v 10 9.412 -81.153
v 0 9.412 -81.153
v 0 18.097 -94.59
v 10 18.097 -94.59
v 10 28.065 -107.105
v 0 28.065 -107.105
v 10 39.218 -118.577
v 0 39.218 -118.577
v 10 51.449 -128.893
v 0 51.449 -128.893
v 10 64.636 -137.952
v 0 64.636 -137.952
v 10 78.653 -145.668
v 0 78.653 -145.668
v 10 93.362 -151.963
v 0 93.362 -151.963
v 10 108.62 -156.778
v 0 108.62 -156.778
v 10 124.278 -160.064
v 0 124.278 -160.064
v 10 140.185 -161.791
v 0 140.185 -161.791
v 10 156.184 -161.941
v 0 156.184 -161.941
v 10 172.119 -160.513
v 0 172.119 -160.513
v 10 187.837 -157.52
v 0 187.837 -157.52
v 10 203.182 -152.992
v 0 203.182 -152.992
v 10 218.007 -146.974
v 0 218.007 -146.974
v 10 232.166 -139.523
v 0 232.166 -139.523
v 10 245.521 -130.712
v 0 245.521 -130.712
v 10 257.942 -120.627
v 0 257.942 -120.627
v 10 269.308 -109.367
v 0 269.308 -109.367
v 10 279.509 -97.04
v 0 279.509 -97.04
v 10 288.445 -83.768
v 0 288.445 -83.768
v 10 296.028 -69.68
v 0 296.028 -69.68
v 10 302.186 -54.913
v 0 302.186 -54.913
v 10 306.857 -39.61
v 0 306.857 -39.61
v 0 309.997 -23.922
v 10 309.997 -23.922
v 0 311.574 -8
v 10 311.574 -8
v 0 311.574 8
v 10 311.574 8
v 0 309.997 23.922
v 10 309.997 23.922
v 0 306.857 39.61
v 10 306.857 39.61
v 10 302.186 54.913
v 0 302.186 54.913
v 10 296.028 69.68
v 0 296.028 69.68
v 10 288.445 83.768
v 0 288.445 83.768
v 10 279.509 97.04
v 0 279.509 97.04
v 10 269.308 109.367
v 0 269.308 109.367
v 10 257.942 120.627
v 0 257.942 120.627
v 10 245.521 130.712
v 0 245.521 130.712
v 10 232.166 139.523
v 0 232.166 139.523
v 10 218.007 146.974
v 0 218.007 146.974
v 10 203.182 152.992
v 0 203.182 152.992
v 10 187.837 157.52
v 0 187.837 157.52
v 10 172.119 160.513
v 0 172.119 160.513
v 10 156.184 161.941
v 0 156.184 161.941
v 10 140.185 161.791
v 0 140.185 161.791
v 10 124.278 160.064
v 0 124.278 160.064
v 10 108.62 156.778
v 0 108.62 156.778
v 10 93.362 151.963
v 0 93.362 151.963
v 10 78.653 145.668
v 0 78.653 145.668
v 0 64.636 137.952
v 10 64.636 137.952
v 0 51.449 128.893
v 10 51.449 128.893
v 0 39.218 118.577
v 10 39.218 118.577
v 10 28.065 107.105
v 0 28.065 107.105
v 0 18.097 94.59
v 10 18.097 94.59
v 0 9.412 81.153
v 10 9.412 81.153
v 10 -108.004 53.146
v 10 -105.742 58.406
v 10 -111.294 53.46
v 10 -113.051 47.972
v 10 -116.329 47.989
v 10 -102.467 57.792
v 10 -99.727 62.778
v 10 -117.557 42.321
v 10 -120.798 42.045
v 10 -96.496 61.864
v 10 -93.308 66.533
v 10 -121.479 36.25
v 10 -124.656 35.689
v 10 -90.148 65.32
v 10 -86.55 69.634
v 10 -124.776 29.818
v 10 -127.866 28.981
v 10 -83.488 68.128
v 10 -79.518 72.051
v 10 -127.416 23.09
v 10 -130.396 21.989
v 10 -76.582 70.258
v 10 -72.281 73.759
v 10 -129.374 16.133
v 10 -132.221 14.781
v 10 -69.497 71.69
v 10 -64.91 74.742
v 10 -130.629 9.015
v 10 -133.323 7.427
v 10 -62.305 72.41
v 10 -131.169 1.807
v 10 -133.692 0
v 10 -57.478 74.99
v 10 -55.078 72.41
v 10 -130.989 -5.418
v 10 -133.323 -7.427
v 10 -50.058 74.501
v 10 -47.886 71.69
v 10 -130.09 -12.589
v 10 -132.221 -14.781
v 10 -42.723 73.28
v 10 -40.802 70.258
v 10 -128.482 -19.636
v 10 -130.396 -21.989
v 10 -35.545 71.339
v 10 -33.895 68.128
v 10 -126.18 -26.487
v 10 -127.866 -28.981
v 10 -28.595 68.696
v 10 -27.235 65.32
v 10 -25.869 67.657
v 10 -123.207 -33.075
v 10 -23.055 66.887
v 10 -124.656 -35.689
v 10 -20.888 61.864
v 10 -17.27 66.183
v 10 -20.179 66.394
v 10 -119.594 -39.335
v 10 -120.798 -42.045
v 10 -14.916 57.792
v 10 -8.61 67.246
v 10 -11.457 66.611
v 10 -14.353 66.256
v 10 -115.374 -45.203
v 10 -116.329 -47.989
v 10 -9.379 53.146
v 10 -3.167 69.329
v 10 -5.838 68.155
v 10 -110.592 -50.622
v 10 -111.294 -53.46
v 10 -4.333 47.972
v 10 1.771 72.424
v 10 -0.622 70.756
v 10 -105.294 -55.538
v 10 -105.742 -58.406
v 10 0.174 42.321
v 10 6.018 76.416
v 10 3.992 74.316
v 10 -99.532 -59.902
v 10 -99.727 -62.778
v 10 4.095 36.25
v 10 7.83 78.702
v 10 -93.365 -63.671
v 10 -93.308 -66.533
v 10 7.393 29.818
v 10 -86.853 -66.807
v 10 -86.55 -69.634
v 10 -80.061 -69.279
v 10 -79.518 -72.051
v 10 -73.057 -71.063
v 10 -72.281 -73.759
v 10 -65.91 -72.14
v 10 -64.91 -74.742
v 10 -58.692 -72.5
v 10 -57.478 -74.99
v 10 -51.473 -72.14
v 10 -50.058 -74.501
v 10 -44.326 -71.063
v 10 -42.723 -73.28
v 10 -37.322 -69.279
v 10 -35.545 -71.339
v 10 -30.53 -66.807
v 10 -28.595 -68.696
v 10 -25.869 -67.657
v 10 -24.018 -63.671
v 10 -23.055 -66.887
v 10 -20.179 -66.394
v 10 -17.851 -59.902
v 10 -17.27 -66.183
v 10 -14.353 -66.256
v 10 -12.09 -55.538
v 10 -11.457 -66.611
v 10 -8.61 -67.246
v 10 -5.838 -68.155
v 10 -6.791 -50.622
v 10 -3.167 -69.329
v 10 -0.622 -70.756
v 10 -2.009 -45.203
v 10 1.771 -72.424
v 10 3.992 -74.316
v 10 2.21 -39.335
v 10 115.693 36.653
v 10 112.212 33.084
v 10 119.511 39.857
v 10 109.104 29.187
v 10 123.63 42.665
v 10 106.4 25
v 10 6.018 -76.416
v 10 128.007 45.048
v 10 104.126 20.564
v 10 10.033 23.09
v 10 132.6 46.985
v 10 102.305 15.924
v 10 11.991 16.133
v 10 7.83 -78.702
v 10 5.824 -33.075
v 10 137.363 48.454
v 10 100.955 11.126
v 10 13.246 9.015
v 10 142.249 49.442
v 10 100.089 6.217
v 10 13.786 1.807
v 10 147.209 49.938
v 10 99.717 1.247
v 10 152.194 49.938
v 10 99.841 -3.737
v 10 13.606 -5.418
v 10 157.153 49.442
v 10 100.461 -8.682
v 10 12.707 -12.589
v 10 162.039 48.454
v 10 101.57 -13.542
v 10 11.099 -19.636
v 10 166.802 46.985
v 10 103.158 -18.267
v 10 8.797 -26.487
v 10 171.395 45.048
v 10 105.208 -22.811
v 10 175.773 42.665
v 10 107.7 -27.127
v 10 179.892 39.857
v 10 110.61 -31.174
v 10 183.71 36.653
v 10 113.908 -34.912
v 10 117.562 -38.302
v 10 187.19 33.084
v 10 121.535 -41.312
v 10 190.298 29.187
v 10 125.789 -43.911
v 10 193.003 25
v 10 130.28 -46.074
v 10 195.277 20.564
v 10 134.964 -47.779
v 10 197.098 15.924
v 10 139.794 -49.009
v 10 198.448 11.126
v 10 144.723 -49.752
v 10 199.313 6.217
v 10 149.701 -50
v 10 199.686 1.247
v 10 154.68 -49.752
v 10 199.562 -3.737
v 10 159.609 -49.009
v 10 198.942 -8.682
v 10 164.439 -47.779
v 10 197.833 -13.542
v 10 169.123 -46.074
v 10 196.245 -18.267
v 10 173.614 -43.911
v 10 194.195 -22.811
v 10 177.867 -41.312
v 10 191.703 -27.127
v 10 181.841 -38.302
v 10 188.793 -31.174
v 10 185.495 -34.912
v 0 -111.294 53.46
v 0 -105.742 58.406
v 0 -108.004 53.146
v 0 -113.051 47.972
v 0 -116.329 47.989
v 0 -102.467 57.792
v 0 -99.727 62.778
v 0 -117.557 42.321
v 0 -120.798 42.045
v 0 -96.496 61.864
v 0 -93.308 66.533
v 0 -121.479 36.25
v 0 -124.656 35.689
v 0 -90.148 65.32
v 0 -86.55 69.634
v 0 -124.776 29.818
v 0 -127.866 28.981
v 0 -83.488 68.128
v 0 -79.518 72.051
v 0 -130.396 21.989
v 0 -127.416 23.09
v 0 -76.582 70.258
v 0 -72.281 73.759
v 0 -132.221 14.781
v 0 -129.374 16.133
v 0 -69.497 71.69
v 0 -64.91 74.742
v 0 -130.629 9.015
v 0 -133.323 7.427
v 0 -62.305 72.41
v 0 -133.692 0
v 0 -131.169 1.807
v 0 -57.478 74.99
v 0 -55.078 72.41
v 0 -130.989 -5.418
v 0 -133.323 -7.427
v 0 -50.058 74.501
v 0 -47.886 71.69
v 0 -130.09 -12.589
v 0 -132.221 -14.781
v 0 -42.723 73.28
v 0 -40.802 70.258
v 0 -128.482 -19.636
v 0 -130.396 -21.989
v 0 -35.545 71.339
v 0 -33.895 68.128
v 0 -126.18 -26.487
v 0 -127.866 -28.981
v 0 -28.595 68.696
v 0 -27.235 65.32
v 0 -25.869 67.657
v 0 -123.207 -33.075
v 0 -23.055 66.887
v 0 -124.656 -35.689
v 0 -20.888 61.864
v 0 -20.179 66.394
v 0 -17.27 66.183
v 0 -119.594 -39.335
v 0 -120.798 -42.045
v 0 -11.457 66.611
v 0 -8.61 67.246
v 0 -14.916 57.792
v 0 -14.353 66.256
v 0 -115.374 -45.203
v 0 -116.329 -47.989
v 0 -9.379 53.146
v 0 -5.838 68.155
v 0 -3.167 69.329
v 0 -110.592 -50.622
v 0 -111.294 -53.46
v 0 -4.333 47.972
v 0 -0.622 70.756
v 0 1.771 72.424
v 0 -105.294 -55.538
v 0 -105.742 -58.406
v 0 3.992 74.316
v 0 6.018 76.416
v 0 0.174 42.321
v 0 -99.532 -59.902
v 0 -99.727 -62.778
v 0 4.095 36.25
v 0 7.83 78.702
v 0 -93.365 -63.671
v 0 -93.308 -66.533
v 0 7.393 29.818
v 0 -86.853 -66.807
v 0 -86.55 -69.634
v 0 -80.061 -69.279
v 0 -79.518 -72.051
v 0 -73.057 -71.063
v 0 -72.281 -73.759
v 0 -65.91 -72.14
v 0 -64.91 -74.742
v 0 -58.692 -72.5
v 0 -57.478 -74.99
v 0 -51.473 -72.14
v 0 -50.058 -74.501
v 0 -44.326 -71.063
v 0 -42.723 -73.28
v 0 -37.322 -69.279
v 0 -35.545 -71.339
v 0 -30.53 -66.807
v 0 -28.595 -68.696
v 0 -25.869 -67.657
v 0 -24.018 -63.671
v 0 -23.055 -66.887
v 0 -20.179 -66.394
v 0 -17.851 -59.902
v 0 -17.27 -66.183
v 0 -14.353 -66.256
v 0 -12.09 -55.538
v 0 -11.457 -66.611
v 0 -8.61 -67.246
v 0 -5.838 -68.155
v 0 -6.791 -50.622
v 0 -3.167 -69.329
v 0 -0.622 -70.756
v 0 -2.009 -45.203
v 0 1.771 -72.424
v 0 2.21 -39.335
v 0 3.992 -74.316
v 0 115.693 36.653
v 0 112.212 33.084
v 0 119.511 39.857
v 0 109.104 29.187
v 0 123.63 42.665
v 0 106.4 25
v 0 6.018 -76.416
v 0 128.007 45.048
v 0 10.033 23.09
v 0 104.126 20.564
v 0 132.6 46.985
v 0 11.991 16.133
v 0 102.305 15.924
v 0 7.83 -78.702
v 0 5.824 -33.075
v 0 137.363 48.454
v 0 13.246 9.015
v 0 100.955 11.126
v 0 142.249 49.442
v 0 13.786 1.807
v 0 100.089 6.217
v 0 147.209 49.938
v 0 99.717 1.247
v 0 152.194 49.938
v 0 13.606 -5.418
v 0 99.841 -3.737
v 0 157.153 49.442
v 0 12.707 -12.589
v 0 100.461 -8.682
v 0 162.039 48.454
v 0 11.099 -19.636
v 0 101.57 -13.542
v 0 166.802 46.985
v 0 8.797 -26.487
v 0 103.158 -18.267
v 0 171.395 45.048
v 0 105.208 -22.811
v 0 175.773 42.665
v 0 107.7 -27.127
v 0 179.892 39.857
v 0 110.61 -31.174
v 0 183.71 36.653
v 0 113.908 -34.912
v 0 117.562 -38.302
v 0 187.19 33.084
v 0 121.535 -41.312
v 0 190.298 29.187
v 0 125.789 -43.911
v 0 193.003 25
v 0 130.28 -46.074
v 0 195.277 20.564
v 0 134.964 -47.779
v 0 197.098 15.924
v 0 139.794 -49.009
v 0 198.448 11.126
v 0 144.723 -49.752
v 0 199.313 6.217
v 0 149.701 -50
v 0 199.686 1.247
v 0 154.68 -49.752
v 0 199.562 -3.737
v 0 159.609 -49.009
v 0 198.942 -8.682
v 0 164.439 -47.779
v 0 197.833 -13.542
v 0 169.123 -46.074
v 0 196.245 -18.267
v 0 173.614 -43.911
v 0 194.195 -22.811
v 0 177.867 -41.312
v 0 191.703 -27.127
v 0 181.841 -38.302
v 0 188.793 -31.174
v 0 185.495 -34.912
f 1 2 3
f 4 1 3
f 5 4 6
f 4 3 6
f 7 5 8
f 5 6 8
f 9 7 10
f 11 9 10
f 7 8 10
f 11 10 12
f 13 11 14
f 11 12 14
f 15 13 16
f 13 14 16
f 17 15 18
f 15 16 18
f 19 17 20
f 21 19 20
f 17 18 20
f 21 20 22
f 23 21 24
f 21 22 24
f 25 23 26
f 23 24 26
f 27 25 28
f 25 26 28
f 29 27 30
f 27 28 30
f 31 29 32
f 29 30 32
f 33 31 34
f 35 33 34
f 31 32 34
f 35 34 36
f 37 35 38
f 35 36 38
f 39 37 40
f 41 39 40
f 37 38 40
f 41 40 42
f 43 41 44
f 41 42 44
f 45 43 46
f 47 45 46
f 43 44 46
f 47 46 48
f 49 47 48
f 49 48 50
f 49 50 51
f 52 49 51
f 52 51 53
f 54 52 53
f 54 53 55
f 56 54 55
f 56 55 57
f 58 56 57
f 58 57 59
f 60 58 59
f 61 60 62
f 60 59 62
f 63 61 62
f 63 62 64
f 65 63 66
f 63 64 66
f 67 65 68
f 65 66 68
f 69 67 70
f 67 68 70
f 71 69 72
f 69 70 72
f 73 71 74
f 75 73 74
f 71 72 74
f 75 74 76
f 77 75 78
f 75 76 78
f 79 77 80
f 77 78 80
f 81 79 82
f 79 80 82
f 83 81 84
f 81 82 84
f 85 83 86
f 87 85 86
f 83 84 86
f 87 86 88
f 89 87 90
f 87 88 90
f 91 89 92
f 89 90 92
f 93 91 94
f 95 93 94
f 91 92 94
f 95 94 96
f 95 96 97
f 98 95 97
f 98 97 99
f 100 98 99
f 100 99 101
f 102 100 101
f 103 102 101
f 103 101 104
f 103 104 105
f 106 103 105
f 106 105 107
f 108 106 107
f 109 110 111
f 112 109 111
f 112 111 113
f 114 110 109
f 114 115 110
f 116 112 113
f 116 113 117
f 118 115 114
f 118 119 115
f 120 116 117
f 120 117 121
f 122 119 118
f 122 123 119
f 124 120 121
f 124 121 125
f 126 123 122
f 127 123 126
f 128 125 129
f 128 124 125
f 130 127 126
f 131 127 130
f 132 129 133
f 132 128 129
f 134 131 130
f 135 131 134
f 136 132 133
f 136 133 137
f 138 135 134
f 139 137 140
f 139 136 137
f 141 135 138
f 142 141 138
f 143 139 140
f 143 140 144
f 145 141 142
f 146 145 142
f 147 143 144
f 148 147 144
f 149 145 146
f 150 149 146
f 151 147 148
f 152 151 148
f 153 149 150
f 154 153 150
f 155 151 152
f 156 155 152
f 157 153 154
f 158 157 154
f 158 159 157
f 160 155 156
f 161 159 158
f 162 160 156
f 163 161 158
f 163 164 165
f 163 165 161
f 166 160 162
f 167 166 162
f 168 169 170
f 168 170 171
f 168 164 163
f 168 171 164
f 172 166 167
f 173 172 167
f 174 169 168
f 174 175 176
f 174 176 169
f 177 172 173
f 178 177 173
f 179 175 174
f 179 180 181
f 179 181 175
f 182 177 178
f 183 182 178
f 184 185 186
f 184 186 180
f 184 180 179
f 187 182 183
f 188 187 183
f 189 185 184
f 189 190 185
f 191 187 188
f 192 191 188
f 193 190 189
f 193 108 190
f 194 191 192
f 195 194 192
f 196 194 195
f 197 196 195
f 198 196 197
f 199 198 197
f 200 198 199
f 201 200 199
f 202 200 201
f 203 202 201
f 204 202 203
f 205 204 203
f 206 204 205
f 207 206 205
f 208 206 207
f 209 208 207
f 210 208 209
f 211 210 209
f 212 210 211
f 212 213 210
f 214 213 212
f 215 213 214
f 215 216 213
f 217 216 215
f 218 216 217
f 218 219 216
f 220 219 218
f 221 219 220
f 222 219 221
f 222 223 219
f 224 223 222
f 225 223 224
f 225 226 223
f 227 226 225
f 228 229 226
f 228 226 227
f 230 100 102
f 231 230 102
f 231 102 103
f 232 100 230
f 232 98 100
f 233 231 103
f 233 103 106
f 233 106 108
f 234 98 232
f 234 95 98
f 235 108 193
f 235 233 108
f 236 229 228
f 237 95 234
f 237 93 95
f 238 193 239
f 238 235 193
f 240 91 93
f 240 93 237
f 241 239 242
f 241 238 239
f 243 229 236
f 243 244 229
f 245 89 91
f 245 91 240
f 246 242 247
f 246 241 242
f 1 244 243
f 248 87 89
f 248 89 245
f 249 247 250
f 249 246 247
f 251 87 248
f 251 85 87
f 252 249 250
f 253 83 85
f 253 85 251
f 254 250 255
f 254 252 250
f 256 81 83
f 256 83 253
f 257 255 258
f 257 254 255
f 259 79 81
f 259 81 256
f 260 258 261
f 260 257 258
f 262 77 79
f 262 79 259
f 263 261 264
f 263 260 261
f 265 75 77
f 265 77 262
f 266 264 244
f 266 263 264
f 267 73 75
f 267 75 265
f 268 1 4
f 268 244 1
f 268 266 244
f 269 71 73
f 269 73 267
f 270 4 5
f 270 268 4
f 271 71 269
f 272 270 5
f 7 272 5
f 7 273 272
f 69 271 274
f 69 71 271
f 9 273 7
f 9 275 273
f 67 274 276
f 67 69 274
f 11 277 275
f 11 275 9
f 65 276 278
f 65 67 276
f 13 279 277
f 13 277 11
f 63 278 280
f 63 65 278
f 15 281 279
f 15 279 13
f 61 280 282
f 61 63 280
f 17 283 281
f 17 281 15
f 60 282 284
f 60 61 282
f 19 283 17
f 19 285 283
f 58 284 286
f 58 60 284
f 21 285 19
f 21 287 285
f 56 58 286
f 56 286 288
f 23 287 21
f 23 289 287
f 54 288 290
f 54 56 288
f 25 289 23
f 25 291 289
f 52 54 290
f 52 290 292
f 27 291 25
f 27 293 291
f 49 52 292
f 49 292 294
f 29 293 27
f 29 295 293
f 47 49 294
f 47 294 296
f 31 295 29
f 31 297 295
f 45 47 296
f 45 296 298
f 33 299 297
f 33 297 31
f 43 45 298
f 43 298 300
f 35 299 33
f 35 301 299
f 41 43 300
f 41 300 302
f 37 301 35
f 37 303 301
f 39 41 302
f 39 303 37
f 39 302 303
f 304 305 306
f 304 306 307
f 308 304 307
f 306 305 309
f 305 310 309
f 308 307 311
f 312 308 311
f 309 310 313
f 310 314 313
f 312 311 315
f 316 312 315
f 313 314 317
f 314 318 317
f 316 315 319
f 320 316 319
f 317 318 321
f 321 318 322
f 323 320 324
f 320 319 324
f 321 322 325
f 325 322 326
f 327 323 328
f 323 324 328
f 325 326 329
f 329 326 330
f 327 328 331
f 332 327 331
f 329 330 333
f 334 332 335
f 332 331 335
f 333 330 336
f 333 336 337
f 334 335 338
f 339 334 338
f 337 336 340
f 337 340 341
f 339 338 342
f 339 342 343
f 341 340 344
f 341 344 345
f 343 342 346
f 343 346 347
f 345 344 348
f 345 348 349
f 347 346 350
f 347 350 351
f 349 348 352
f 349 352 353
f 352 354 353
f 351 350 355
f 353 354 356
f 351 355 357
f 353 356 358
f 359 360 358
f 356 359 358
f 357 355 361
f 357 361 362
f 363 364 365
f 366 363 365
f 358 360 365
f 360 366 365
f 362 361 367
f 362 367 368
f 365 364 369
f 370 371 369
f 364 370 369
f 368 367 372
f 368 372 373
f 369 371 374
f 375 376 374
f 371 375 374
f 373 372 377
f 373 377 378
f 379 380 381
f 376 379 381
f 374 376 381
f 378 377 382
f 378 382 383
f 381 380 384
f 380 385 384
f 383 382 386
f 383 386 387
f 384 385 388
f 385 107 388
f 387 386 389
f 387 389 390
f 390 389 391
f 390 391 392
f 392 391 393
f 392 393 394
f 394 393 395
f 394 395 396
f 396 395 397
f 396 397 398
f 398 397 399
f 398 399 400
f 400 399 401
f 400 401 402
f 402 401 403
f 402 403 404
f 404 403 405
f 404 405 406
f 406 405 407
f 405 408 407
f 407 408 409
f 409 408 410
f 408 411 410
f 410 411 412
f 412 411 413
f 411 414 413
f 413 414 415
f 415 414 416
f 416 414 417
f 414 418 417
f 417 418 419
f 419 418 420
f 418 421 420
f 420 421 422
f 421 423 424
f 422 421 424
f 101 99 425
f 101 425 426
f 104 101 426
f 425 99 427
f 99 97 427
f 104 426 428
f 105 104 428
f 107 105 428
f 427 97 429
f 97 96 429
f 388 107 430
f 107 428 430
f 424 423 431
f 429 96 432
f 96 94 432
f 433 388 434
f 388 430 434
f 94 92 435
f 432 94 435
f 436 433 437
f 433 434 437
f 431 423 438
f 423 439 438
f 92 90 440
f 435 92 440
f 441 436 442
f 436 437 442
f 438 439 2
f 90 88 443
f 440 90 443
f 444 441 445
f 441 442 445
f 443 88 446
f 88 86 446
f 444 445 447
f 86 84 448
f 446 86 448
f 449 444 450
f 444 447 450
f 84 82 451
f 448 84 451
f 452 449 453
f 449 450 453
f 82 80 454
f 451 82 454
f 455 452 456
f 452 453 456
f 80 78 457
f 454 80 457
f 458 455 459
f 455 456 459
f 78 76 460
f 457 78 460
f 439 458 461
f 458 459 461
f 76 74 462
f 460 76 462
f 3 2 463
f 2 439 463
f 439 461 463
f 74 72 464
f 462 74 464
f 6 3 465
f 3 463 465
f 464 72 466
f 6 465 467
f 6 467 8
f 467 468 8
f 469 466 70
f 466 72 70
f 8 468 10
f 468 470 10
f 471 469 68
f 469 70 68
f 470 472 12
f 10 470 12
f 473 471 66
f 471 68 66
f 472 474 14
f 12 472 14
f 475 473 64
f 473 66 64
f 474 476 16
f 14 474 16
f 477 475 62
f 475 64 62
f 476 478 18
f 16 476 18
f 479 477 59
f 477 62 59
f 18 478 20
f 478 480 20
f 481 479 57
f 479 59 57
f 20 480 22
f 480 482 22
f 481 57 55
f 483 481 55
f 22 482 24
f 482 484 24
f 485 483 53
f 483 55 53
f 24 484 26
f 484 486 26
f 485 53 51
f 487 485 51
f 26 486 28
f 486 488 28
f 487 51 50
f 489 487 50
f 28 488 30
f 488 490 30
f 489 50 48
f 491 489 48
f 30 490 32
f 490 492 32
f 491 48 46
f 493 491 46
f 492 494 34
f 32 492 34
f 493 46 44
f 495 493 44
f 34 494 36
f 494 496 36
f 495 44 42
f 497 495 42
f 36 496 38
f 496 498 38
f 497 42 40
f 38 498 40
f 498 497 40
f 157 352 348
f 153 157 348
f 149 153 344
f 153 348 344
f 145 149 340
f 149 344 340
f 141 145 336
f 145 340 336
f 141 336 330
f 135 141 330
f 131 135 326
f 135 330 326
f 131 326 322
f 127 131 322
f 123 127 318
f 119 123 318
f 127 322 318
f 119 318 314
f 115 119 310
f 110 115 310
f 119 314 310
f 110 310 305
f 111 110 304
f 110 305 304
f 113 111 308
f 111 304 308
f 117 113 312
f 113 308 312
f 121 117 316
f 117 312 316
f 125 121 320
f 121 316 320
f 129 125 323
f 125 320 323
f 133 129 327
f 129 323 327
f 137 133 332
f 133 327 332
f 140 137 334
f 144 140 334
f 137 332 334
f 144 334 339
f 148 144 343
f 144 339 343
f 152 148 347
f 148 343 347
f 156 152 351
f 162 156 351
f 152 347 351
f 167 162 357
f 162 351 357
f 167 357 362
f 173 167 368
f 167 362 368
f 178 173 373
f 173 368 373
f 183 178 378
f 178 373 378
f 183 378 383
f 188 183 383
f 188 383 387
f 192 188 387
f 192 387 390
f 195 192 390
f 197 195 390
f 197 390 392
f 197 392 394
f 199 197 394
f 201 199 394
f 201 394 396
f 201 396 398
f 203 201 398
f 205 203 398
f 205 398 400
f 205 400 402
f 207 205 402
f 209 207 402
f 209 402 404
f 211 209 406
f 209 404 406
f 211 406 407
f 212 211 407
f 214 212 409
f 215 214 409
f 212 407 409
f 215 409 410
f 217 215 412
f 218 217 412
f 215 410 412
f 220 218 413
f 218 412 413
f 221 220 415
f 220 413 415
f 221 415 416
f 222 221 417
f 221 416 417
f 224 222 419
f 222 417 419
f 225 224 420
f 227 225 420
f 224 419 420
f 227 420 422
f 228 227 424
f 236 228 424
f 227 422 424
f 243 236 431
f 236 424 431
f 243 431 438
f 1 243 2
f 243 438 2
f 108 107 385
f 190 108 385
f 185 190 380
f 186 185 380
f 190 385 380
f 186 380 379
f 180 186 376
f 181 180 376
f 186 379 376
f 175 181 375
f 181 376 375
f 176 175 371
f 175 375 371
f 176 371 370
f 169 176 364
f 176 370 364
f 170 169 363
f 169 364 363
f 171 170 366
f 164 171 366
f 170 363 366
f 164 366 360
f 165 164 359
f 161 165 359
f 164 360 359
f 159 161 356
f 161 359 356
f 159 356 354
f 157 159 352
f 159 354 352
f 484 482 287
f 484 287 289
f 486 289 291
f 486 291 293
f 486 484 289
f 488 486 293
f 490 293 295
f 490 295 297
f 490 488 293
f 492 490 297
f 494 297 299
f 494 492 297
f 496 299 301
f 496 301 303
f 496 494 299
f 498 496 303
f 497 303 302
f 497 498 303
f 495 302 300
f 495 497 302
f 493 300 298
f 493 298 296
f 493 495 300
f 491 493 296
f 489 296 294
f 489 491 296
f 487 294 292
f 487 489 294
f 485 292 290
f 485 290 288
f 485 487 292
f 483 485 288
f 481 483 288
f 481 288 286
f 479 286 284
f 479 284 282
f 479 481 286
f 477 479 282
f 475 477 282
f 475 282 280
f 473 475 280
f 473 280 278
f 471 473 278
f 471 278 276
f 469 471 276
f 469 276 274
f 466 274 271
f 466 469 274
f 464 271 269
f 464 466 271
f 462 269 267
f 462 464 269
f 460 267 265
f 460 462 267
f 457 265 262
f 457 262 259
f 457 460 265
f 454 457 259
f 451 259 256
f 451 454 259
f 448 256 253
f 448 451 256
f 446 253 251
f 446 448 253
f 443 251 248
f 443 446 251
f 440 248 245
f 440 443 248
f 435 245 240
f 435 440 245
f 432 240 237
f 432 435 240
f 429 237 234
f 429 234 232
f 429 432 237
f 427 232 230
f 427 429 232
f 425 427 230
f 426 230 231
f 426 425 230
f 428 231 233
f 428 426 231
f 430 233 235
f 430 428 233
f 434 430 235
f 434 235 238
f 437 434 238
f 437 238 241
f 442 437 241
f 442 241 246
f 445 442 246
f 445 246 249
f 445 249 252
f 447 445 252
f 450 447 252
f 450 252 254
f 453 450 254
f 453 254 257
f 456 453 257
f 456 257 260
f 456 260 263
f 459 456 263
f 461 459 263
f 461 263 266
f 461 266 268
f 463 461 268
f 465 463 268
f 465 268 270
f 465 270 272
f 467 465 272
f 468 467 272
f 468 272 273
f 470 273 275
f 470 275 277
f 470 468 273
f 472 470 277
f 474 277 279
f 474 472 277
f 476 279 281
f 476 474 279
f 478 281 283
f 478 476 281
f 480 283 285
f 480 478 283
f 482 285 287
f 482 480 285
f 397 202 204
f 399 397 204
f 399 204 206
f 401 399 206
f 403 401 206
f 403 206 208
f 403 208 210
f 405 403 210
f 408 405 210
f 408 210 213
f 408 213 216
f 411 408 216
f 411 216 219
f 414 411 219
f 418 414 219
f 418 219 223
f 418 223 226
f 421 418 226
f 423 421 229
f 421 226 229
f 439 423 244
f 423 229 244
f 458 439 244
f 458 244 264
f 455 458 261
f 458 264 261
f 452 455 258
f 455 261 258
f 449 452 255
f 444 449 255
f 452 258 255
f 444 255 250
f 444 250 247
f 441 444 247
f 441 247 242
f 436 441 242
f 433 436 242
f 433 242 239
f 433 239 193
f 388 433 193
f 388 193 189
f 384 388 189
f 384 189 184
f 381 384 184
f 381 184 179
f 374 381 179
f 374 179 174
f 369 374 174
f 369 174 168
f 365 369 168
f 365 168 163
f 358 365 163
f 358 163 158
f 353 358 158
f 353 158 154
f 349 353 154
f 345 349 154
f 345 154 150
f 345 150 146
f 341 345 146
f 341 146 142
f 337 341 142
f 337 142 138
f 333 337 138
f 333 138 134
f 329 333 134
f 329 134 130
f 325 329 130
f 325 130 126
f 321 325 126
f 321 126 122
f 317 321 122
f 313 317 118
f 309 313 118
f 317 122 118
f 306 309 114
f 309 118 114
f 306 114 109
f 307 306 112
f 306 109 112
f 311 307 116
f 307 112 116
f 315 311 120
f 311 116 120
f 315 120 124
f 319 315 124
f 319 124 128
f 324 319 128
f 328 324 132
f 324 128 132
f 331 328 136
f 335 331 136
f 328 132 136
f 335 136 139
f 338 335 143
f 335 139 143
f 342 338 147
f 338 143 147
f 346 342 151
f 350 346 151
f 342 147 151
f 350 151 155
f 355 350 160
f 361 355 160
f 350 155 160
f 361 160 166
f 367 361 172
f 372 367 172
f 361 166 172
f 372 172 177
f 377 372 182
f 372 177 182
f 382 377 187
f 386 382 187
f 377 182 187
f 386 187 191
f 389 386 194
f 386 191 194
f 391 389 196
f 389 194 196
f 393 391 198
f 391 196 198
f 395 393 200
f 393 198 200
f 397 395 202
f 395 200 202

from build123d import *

# Parameters (mm, degrees)
SKETCH1_R           = 50
BOSS_EXTRUDE1_DEPTH = 10
SKETCH2_R           = 72.5
CUT_EXTRUDE1_DEPTH  = 352.523431325


with BuildPart() as part:
    # Sketch1 → Boss-Extrude1 (new body)
    with BuildSketch(Plane(origin=(0, 0, 0), x_dir=(0, 0, -1), z_dir=(1, 0, 0))):
        with BuildLine():
            ThreePointArc((81.153066922, 9.411970763), (0, 311.772037013), (-81.153066922, 9.411970763))
            ThreePointArc((-81.153066922, 9.411970763), (-67.666963002, -7.212746854), (-68.696324701, -28.59490412))
            ThreePointArc((-68.696324701, -28.59490412), (0, -133.691664287), (68.696324701, -28.59490412))
            ThreePointArc((68.696324701, -28.59490412), (67.666963002, -7.212746854), (81.153066922, 9.411970763))
        make_face()
        with Locations((0, 149.701312613)):
            Circle(SKETCH1_R, mode=Mode.SUBTRACT)
    extrude(amount=BOSS_EXTRUDE1_DEPTH)

    # Sketch2 → Cut-Extrude1 (cut, through all)
    with BuildSketch(Plane(origin=(10, 0, 0), x_dir=(0, 0, -1), z_dir=(1, 0, 0))):
        with Locations((0, -58.691664287)):
            Circle(SKETCH2_R)
    extrude(amount=-CUT_EXTRUDE1_DEPTH, mode=Mode.SUBTRACT)


solid = part.part
